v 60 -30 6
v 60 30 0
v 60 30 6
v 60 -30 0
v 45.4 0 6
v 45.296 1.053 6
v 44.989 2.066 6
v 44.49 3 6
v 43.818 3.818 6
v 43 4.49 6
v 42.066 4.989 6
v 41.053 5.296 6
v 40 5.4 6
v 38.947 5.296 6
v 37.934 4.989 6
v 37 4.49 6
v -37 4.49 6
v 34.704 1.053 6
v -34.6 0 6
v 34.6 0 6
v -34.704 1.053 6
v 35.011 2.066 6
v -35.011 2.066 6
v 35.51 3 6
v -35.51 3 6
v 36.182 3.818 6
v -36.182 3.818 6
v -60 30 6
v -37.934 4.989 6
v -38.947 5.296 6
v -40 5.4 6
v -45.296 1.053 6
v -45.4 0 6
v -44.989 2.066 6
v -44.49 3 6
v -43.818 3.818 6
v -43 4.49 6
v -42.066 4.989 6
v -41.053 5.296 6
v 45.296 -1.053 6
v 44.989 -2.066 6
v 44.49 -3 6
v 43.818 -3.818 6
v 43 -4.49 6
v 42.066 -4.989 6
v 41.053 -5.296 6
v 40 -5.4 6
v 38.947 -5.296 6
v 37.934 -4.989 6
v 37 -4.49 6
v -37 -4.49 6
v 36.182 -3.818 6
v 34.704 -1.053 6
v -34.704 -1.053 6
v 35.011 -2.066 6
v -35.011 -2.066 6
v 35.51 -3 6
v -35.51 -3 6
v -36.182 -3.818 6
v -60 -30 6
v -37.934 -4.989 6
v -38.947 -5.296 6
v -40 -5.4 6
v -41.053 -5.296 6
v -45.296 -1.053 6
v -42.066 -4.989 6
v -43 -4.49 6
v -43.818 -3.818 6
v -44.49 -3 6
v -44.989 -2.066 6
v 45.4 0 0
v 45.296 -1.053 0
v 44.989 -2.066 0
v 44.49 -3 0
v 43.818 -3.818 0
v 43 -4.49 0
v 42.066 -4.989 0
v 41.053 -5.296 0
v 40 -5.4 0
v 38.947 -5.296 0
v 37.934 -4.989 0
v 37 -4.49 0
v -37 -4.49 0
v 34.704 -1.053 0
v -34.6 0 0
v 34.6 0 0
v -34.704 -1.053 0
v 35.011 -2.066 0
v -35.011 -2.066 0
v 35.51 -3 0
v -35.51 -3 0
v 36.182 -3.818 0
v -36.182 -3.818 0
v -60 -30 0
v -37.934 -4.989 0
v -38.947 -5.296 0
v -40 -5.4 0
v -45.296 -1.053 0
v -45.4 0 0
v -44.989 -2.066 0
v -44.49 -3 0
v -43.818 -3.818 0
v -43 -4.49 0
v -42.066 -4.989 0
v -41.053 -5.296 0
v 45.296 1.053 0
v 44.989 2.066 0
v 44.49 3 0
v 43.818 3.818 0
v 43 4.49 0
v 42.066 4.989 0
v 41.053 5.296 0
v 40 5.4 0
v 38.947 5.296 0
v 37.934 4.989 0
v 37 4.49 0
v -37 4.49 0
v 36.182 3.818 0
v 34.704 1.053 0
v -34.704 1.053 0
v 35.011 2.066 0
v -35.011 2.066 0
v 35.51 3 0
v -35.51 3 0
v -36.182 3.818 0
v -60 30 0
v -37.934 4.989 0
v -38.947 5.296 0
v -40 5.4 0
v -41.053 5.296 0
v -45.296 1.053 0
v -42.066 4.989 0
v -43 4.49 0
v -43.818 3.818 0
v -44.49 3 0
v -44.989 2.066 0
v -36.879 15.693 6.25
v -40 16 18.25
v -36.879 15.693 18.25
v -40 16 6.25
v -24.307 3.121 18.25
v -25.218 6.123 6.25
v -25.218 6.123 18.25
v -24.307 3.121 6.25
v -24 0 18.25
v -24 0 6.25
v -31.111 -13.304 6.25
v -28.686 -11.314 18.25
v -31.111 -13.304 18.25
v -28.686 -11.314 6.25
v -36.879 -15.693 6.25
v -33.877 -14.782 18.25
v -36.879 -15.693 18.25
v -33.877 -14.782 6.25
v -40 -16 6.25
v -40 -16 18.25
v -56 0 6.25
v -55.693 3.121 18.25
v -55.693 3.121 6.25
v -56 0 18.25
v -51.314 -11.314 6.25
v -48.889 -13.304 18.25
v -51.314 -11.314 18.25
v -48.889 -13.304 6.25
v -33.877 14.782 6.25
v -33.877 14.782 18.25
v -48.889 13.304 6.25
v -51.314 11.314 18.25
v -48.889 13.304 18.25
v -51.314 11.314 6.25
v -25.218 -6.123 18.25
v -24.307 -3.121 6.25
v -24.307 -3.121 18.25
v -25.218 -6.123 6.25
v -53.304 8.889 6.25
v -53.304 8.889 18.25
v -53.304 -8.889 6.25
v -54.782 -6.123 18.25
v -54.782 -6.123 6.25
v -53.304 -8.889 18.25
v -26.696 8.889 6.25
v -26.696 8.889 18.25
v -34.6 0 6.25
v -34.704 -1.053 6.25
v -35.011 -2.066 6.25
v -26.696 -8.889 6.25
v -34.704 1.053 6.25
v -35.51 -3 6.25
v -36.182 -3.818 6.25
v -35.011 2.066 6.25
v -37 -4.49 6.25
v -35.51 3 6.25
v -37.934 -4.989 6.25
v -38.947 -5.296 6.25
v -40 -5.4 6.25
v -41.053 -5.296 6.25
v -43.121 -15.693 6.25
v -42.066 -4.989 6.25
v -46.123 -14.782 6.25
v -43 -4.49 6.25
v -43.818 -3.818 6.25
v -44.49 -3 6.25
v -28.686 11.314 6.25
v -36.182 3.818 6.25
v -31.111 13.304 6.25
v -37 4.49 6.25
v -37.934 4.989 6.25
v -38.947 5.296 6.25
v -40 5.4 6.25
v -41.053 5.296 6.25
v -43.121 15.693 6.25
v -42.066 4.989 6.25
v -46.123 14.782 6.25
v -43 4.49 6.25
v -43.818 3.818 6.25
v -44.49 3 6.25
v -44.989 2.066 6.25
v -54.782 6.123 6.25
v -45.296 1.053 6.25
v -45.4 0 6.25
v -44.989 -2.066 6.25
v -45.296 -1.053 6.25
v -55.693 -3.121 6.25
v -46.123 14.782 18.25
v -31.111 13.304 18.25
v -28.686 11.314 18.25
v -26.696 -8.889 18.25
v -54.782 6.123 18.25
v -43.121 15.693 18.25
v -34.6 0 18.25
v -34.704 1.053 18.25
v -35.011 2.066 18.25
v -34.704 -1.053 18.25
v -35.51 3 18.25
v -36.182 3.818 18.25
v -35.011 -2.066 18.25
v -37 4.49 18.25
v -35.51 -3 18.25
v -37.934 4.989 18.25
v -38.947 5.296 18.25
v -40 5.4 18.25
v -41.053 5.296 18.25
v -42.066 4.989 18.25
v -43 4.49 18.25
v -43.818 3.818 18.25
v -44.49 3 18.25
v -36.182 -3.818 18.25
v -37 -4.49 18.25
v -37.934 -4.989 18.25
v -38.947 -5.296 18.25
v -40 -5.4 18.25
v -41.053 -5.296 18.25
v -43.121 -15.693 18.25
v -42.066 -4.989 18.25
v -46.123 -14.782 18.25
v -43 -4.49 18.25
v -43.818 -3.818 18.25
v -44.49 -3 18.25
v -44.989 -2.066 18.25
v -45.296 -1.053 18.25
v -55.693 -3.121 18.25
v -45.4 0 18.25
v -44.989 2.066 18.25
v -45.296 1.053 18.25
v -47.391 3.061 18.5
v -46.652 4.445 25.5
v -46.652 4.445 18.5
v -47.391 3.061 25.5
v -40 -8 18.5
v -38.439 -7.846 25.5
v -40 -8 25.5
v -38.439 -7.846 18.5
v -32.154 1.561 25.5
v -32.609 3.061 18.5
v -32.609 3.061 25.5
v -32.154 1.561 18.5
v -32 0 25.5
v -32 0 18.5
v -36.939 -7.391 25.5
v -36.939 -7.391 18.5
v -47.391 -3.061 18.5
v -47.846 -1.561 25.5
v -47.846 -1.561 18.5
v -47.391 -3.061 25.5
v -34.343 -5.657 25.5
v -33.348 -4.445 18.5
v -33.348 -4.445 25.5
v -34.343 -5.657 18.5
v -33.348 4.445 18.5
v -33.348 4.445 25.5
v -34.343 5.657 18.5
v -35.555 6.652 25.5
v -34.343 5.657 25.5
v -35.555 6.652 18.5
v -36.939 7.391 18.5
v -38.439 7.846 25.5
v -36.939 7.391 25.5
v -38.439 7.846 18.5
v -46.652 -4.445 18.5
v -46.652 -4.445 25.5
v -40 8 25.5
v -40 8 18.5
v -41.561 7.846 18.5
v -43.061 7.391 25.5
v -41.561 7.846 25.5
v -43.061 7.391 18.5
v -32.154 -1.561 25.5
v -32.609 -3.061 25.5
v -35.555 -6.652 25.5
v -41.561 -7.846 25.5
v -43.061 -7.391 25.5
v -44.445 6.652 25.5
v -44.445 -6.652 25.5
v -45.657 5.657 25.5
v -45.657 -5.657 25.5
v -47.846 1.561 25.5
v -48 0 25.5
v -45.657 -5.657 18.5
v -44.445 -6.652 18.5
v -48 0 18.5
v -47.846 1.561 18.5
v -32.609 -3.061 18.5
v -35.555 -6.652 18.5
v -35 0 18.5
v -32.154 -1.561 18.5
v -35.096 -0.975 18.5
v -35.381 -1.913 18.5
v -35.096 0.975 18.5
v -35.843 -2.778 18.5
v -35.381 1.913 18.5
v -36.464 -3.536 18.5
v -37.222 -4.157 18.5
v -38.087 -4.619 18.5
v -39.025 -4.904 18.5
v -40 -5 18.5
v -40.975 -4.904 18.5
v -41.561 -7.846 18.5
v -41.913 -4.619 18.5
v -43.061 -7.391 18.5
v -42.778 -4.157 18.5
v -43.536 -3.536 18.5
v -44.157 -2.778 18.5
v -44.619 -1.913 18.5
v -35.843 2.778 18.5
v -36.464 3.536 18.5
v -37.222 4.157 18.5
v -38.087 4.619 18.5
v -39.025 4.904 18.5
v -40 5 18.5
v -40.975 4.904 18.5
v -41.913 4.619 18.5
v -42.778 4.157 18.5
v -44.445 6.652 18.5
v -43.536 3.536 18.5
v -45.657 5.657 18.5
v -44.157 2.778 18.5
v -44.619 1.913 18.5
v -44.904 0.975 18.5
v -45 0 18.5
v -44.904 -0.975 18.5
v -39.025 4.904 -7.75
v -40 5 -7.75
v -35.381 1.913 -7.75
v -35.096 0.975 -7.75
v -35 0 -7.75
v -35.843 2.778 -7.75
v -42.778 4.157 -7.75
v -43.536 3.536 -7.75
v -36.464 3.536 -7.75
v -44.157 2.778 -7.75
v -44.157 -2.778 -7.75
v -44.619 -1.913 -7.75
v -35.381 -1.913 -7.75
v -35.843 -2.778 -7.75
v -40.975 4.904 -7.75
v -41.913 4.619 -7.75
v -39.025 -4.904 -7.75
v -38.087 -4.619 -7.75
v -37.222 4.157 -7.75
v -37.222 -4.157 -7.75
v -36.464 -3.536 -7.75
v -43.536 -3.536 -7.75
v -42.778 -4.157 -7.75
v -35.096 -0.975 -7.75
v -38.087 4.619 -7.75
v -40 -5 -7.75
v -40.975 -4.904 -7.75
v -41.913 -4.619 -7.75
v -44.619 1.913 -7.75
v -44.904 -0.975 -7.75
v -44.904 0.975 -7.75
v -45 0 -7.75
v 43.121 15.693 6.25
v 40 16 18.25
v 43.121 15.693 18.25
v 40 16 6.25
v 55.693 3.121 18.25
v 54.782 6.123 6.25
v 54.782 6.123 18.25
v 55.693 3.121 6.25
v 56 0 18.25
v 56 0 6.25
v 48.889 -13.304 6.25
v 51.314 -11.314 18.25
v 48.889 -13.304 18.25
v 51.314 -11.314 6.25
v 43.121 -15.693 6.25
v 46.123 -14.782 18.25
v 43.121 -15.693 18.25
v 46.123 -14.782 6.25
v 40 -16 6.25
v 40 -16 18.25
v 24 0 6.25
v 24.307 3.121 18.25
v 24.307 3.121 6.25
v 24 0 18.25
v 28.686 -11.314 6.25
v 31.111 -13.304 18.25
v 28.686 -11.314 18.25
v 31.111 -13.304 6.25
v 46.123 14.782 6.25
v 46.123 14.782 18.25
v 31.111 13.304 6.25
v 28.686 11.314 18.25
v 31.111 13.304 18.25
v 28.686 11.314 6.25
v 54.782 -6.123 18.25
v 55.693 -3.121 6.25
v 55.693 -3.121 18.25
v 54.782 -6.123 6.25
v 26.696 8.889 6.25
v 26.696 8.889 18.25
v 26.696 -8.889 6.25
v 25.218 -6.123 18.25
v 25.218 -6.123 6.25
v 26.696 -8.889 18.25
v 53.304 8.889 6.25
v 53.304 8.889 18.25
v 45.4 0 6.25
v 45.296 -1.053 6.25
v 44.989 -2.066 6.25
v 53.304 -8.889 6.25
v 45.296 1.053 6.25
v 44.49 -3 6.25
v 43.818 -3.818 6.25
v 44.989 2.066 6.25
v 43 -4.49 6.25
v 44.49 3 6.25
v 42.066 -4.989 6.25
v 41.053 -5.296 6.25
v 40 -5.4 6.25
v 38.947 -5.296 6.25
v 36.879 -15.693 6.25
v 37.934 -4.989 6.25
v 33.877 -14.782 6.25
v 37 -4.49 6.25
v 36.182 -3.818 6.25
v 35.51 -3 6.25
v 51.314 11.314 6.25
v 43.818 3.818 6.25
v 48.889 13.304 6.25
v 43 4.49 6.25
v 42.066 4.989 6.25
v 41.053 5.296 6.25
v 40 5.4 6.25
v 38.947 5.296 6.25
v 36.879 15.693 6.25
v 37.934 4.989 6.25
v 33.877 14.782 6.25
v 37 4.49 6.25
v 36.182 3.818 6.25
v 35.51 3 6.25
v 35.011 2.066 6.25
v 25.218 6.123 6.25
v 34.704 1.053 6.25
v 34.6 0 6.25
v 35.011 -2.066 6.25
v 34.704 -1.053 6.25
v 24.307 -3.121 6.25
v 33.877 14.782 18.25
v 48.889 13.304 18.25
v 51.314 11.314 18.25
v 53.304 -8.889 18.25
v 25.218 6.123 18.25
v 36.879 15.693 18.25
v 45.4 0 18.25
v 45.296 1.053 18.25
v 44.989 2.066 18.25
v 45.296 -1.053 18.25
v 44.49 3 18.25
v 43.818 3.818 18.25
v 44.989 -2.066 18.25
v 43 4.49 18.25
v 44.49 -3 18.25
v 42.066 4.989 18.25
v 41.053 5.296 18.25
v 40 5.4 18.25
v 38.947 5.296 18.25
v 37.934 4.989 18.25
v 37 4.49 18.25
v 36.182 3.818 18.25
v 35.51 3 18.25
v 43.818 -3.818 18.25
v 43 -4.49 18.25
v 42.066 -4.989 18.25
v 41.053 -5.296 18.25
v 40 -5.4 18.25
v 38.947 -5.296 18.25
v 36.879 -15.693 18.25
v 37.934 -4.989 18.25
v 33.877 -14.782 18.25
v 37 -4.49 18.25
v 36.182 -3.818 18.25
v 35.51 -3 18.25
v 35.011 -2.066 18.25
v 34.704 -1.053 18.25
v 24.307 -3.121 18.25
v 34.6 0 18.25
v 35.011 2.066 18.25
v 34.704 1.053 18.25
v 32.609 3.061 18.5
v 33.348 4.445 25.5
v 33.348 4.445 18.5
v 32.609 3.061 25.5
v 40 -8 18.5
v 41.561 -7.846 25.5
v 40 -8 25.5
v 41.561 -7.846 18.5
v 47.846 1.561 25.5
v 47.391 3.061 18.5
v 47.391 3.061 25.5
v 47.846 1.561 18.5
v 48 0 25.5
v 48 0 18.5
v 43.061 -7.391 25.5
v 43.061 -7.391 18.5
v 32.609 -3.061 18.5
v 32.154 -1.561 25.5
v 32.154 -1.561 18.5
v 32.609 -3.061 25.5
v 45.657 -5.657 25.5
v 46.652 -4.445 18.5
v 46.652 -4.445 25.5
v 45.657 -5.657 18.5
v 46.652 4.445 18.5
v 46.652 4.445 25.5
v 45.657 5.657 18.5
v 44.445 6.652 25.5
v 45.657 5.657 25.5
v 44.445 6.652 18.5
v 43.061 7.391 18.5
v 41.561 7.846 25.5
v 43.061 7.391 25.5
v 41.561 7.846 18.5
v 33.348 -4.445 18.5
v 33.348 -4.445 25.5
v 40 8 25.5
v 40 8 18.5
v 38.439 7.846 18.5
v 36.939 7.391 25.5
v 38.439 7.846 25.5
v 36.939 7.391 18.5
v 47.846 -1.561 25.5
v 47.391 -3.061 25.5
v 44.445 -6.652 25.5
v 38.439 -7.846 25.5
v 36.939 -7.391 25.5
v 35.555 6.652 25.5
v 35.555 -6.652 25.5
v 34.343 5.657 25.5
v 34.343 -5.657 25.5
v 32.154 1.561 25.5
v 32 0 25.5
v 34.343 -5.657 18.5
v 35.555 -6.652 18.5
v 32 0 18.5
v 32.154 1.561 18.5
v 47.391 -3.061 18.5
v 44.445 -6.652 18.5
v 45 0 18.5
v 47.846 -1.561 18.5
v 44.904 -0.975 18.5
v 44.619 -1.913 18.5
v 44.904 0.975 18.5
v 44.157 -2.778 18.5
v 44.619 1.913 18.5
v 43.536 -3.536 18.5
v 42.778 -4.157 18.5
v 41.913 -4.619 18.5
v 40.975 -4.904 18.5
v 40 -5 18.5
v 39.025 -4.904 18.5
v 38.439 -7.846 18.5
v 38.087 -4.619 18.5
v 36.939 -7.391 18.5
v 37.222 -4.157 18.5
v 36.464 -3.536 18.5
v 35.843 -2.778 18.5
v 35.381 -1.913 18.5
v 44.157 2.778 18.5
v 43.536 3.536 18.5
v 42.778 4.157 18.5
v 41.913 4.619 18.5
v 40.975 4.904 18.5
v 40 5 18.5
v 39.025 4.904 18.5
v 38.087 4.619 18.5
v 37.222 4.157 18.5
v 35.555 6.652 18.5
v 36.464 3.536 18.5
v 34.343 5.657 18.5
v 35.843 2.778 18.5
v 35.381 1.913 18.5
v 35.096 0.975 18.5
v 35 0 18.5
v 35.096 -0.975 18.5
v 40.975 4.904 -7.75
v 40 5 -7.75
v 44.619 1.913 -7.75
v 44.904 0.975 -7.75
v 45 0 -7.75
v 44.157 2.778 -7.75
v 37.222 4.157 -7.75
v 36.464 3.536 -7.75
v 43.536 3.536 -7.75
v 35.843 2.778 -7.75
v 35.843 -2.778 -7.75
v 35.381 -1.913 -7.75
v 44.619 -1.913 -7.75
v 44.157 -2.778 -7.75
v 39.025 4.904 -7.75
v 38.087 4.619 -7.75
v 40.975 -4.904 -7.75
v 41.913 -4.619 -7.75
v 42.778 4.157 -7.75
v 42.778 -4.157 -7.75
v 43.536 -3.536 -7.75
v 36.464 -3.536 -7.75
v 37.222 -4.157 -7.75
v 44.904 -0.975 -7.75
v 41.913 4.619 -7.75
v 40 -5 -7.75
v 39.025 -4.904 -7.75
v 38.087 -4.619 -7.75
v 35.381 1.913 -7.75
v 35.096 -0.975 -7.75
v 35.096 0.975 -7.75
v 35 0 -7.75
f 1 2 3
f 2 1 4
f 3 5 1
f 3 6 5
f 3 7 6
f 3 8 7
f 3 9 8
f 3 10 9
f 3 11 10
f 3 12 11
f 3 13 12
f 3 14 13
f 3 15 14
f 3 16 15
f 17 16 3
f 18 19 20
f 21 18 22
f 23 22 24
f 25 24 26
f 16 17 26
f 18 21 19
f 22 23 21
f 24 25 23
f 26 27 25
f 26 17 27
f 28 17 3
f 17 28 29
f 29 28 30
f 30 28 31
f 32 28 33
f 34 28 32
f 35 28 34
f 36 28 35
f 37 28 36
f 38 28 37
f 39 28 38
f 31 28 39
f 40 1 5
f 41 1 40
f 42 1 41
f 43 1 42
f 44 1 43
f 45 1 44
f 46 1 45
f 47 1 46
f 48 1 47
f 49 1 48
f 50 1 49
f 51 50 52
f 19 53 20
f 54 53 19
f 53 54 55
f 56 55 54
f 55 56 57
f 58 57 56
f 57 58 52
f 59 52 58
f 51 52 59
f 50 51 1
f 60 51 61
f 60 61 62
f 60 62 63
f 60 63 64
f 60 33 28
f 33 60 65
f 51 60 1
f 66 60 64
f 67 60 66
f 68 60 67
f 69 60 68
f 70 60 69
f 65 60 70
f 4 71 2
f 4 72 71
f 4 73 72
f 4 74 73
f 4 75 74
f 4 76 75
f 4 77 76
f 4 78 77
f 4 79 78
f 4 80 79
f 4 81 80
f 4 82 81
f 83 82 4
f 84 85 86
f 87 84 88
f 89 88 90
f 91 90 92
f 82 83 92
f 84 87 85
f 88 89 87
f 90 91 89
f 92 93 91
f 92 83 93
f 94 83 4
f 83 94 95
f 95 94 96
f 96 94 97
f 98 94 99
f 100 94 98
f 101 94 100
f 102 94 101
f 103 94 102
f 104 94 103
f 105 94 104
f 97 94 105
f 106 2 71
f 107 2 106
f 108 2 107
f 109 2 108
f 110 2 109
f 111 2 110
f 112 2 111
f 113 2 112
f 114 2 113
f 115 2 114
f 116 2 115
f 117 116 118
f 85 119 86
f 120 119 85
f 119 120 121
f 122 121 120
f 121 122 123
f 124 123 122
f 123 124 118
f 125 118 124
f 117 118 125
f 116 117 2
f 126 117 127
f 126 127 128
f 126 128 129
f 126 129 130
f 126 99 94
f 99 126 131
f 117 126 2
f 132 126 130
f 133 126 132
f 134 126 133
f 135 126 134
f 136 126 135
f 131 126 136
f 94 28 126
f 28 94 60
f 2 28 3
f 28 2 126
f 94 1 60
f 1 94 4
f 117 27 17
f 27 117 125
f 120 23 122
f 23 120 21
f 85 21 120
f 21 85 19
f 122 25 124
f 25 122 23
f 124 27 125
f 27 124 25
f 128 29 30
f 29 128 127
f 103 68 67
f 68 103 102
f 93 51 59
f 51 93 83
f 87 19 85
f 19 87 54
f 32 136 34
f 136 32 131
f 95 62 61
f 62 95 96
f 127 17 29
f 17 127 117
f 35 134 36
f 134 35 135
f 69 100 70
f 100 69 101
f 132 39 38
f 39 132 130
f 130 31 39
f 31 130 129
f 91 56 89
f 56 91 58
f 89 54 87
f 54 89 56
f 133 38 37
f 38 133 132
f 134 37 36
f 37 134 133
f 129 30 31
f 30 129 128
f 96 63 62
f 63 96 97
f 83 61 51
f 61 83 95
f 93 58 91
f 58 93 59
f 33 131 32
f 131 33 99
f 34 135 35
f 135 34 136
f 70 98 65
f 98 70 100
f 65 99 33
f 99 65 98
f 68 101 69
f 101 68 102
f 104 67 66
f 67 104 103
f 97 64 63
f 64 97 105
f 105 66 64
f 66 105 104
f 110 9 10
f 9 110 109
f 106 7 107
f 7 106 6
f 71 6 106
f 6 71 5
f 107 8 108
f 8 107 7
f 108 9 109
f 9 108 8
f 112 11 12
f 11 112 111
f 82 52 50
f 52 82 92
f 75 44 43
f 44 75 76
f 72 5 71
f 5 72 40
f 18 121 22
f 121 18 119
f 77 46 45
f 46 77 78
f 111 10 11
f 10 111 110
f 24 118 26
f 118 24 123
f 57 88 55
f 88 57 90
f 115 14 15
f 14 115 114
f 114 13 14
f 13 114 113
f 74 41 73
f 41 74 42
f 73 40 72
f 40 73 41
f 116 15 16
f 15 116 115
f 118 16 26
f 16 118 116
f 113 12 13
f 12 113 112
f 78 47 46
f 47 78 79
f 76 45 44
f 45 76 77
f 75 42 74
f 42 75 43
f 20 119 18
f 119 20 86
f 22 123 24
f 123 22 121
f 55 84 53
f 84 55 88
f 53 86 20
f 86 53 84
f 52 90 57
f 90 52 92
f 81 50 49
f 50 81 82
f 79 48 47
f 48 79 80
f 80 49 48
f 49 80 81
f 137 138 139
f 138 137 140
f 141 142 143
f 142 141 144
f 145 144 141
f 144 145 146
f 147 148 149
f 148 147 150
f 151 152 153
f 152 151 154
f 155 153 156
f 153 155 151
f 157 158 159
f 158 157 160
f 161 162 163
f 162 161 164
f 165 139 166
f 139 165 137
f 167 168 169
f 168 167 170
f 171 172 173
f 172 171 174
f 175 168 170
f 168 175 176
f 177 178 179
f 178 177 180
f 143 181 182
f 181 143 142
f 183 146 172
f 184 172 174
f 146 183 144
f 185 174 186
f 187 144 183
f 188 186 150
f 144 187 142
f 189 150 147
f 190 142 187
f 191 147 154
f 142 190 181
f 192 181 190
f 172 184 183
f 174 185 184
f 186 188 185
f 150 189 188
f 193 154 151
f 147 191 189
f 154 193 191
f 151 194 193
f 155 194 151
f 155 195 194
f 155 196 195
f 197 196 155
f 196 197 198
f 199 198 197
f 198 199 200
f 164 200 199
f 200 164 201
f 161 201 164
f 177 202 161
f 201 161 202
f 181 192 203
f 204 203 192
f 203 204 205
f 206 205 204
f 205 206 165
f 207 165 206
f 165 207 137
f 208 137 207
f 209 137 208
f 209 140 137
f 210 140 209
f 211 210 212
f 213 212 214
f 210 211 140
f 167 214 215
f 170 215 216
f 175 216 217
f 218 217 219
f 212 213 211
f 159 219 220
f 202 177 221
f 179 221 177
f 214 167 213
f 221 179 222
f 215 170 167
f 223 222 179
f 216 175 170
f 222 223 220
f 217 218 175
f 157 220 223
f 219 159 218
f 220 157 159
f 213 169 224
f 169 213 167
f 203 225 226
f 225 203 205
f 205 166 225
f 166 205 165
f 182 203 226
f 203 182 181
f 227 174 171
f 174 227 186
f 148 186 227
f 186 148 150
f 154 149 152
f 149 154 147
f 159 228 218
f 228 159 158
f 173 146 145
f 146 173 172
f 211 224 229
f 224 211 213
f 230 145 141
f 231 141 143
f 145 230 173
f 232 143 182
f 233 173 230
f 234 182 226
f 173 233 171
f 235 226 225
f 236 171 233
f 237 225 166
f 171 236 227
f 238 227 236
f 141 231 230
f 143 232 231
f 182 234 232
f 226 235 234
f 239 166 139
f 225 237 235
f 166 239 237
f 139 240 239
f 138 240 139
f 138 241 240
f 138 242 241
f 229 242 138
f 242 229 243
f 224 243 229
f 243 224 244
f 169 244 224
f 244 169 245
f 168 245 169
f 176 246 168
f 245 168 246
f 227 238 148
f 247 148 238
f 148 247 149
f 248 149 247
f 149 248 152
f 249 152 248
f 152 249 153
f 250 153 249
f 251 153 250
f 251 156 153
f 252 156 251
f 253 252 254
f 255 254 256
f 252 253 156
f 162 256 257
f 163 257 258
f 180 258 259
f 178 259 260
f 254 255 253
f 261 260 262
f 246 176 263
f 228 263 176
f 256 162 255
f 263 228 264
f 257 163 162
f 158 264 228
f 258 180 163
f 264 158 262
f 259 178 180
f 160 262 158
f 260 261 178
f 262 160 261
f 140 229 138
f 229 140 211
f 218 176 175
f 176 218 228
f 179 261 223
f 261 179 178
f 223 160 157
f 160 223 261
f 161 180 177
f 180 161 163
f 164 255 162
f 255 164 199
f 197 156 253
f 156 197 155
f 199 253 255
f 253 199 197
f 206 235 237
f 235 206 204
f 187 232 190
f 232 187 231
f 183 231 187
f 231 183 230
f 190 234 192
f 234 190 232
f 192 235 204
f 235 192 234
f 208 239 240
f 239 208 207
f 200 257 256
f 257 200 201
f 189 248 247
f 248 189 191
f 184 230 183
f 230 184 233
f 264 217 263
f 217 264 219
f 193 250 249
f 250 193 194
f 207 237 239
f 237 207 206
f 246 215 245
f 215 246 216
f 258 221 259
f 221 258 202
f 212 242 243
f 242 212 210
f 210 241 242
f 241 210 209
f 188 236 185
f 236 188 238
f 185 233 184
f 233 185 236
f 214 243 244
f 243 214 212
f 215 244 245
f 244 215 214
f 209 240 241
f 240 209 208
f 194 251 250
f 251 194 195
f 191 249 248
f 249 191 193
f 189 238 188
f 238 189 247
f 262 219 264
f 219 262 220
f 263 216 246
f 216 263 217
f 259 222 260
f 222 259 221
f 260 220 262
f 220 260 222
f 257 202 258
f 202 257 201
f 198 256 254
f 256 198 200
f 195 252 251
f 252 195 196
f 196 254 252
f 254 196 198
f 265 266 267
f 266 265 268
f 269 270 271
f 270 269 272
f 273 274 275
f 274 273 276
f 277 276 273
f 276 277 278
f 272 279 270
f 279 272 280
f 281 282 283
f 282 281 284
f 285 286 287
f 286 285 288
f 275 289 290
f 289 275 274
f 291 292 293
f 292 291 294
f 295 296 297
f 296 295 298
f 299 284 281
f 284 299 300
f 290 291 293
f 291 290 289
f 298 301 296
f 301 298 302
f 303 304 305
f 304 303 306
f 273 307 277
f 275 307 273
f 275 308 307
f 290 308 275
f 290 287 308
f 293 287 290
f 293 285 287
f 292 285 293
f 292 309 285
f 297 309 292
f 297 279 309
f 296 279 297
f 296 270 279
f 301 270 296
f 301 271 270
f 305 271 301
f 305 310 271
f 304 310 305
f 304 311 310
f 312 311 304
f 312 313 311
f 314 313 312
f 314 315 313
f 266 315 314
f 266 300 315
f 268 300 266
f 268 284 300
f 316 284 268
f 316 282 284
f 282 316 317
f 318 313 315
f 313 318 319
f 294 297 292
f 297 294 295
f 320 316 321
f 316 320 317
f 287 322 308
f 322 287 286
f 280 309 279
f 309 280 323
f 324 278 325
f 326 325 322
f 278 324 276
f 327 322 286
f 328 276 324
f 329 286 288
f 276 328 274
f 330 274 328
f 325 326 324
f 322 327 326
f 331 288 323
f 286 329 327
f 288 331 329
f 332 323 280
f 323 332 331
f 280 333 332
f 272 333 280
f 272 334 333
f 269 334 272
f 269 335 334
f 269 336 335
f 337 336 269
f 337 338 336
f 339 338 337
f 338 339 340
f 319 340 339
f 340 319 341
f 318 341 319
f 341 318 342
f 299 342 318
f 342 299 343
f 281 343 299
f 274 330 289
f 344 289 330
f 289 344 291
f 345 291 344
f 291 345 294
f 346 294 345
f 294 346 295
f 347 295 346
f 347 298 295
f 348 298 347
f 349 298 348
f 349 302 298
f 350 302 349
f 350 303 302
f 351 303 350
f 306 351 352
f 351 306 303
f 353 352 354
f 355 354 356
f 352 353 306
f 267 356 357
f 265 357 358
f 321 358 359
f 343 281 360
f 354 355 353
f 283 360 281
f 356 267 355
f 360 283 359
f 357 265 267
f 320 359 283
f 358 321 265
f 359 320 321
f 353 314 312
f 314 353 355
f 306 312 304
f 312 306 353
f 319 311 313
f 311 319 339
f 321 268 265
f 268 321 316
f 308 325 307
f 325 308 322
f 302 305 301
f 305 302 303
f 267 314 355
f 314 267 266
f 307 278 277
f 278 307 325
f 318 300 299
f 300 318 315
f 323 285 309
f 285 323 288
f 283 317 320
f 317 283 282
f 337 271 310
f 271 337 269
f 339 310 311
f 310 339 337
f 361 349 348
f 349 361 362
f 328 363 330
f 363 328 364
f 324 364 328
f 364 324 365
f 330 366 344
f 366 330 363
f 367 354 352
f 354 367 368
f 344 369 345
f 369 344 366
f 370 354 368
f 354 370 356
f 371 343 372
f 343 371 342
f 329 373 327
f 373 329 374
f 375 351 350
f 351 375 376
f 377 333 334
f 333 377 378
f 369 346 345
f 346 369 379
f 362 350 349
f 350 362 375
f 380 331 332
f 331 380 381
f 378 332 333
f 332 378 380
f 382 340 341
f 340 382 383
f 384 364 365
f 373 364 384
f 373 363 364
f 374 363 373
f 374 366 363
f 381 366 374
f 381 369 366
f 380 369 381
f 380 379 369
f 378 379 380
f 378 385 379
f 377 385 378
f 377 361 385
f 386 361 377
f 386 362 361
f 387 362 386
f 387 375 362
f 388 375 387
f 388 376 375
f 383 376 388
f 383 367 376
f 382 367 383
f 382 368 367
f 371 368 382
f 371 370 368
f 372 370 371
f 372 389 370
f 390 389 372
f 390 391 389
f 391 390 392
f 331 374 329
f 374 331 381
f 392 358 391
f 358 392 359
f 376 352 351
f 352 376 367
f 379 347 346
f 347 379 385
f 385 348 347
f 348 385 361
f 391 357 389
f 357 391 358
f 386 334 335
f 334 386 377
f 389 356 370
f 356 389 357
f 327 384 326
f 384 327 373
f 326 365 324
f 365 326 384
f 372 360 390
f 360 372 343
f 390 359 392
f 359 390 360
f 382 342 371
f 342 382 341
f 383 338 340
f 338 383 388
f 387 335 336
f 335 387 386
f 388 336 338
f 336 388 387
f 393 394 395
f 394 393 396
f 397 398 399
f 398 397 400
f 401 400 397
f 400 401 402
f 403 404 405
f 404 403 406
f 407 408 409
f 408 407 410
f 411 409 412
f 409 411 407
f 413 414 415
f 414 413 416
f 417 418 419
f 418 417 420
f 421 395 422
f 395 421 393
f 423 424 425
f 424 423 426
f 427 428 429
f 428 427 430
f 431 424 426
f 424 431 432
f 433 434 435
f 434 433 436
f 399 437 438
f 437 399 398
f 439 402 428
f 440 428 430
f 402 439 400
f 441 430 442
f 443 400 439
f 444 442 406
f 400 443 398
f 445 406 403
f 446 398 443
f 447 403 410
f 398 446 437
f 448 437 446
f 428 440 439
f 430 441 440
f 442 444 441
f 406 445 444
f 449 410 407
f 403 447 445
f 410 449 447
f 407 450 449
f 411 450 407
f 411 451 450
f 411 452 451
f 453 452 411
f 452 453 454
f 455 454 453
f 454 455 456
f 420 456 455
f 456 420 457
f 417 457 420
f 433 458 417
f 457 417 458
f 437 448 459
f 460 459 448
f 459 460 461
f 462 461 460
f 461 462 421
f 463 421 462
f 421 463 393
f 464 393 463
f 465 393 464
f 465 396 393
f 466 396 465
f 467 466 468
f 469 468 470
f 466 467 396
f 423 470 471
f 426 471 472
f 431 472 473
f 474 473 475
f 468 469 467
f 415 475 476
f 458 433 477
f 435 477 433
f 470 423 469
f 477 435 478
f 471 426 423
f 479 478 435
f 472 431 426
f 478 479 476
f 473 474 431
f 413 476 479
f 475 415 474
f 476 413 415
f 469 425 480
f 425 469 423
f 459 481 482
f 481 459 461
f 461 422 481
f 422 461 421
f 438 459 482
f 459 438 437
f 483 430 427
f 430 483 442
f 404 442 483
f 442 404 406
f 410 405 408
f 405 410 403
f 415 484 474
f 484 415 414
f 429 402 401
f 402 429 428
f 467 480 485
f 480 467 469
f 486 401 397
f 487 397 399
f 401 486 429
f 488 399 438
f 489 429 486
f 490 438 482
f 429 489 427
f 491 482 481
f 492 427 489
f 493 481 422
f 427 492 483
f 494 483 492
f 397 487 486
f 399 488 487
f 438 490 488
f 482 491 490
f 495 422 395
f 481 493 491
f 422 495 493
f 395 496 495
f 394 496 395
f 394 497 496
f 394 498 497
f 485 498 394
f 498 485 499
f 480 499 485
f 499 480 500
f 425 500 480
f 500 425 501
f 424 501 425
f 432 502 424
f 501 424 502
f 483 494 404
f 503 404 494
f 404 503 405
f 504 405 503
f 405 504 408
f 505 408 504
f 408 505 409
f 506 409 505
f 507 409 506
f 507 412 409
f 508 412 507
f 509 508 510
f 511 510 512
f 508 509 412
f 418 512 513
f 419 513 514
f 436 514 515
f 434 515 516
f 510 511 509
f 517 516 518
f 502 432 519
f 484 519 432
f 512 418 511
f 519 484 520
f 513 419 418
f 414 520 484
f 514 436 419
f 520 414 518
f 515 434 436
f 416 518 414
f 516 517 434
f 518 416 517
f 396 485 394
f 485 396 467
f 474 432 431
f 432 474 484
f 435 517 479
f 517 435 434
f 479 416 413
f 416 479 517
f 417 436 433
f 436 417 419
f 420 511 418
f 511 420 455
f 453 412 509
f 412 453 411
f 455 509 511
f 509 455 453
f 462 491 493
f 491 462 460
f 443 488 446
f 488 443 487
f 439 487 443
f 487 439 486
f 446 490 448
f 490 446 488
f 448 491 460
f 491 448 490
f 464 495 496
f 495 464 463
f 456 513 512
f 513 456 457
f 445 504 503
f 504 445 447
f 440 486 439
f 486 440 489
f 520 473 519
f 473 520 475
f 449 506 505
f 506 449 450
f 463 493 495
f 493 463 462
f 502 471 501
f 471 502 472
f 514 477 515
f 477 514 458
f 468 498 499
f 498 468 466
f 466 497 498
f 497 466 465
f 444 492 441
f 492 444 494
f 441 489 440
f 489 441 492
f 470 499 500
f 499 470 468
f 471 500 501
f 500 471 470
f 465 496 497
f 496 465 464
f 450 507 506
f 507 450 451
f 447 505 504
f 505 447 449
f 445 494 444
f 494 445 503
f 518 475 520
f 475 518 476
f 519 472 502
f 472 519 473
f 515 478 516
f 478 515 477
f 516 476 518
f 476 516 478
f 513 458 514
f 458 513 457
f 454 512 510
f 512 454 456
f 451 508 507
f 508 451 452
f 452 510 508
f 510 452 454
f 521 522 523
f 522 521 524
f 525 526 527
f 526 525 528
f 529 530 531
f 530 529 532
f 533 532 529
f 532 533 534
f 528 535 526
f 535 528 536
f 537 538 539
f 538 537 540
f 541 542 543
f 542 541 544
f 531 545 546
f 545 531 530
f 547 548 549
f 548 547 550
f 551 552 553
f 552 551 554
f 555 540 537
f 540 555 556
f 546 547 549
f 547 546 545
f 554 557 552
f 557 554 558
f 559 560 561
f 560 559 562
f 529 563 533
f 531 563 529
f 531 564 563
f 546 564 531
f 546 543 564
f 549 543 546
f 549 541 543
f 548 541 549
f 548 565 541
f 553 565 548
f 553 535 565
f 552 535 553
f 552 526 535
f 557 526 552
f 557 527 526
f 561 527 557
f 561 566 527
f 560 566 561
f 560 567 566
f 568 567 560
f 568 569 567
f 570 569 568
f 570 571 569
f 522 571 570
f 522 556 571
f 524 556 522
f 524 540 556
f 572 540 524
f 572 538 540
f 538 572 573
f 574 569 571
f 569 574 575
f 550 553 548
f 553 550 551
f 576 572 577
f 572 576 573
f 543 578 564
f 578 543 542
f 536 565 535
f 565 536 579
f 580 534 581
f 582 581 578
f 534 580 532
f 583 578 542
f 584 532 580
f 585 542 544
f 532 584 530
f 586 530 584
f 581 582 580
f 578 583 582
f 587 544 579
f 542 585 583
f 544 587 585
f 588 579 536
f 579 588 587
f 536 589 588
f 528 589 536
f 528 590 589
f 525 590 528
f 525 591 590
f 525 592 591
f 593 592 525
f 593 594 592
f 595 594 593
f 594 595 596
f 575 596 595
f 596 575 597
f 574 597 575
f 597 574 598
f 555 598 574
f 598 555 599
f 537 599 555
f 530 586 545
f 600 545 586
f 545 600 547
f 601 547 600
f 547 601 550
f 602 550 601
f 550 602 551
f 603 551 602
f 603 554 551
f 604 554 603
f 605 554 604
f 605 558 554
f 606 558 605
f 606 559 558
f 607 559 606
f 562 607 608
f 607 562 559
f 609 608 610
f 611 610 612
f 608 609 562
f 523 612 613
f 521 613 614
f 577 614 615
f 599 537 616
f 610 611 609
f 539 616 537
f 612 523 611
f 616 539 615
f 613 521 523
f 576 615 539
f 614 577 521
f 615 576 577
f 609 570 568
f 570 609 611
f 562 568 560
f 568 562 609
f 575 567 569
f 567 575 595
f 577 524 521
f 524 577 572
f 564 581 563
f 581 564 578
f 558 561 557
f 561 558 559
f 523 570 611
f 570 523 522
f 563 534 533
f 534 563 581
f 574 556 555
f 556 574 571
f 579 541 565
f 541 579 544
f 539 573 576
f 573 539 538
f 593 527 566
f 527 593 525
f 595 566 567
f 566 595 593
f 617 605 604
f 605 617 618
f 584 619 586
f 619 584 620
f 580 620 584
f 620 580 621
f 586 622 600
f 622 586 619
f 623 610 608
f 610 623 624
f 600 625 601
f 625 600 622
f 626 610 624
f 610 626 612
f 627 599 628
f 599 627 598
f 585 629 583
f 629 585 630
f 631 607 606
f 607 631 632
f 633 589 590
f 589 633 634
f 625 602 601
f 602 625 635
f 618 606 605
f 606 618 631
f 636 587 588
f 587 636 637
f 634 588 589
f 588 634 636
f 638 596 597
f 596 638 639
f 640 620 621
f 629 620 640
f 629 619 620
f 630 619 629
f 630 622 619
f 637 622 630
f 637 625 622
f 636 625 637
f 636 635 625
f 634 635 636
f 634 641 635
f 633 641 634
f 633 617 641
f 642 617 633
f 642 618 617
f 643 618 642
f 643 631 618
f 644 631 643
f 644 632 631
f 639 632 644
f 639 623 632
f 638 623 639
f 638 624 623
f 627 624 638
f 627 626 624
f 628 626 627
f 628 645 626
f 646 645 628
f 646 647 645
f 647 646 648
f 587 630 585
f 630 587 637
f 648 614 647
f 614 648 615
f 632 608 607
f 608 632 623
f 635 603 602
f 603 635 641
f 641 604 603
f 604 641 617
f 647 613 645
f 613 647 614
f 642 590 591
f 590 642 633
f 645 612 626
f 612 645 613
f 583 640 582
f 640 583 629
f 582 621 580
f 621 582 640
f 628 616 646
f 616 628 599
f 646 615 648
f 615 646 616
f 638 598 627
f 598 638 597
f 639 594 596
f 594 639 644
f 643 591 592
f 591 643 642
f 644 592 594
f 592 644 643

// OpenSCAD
$fn = 32;

// ------------------------------------------------------------------------
// Standoff columns: 2 d32 standoffs, bolts d10
// Every part is its own module, assembly() places them once.
// ------------------------------------------------------------------------

// --- part 1 ---
module base_plate() {
  difference() {
    translate([-60, -30, 0]) cube([120, 60, 6]);
    translate([-40, 0, -1]) cylinder(h = 8, d = 10.8);
    translate([40, 0, -1]) cylinder(h = 8, d = 10.8);
  }
}

// --- part 2 ---
module spacer1() {
  difference() {
      translate([0, 0, 0]) cylinder(h = 12, d = 32);
      translate([0, 0, -1]) cylinder(h = 14, d = 10.8);
    }
}

// --- part 3 ---
module bolt1() {
  cylinder(h = 7, d = 16);
  translate([0, 0, -26.25]) cylinder(h = 26.25, d = 10);
}

// --- part 4 ---
module spacer2() {
  difference() {
      translate([0, 0, 0]) cylinder(h = 12, d = 32);
      translate([0, 0, -1]) cylinder(h = 14, d = 10.8);
    }
}

// --- part 5 ---
module bolt2() {
  cylinder(h = 7, d = 16);
  translate([0, 0, -26.25]) cylinder(h = 26.25, d = 10);
}

// --- assembly ---
module assembly() {
  translate([0, 0, 0]) rotate([0, 0, 0]) base_plate();
  translate([-40, 0, 6.25]) rotate([0, 0, 0]) spacer1();
  translate([-40, 0, 18.5]) rotate([0, 0, 0]) bolt1();
  translate([40, 0, 6.25]) rotate([0, 0, 0]) spacer2();
  translate([40, 0, 18.5]) rotate([0, 0, 0]) bolt2();
}

assembly();
